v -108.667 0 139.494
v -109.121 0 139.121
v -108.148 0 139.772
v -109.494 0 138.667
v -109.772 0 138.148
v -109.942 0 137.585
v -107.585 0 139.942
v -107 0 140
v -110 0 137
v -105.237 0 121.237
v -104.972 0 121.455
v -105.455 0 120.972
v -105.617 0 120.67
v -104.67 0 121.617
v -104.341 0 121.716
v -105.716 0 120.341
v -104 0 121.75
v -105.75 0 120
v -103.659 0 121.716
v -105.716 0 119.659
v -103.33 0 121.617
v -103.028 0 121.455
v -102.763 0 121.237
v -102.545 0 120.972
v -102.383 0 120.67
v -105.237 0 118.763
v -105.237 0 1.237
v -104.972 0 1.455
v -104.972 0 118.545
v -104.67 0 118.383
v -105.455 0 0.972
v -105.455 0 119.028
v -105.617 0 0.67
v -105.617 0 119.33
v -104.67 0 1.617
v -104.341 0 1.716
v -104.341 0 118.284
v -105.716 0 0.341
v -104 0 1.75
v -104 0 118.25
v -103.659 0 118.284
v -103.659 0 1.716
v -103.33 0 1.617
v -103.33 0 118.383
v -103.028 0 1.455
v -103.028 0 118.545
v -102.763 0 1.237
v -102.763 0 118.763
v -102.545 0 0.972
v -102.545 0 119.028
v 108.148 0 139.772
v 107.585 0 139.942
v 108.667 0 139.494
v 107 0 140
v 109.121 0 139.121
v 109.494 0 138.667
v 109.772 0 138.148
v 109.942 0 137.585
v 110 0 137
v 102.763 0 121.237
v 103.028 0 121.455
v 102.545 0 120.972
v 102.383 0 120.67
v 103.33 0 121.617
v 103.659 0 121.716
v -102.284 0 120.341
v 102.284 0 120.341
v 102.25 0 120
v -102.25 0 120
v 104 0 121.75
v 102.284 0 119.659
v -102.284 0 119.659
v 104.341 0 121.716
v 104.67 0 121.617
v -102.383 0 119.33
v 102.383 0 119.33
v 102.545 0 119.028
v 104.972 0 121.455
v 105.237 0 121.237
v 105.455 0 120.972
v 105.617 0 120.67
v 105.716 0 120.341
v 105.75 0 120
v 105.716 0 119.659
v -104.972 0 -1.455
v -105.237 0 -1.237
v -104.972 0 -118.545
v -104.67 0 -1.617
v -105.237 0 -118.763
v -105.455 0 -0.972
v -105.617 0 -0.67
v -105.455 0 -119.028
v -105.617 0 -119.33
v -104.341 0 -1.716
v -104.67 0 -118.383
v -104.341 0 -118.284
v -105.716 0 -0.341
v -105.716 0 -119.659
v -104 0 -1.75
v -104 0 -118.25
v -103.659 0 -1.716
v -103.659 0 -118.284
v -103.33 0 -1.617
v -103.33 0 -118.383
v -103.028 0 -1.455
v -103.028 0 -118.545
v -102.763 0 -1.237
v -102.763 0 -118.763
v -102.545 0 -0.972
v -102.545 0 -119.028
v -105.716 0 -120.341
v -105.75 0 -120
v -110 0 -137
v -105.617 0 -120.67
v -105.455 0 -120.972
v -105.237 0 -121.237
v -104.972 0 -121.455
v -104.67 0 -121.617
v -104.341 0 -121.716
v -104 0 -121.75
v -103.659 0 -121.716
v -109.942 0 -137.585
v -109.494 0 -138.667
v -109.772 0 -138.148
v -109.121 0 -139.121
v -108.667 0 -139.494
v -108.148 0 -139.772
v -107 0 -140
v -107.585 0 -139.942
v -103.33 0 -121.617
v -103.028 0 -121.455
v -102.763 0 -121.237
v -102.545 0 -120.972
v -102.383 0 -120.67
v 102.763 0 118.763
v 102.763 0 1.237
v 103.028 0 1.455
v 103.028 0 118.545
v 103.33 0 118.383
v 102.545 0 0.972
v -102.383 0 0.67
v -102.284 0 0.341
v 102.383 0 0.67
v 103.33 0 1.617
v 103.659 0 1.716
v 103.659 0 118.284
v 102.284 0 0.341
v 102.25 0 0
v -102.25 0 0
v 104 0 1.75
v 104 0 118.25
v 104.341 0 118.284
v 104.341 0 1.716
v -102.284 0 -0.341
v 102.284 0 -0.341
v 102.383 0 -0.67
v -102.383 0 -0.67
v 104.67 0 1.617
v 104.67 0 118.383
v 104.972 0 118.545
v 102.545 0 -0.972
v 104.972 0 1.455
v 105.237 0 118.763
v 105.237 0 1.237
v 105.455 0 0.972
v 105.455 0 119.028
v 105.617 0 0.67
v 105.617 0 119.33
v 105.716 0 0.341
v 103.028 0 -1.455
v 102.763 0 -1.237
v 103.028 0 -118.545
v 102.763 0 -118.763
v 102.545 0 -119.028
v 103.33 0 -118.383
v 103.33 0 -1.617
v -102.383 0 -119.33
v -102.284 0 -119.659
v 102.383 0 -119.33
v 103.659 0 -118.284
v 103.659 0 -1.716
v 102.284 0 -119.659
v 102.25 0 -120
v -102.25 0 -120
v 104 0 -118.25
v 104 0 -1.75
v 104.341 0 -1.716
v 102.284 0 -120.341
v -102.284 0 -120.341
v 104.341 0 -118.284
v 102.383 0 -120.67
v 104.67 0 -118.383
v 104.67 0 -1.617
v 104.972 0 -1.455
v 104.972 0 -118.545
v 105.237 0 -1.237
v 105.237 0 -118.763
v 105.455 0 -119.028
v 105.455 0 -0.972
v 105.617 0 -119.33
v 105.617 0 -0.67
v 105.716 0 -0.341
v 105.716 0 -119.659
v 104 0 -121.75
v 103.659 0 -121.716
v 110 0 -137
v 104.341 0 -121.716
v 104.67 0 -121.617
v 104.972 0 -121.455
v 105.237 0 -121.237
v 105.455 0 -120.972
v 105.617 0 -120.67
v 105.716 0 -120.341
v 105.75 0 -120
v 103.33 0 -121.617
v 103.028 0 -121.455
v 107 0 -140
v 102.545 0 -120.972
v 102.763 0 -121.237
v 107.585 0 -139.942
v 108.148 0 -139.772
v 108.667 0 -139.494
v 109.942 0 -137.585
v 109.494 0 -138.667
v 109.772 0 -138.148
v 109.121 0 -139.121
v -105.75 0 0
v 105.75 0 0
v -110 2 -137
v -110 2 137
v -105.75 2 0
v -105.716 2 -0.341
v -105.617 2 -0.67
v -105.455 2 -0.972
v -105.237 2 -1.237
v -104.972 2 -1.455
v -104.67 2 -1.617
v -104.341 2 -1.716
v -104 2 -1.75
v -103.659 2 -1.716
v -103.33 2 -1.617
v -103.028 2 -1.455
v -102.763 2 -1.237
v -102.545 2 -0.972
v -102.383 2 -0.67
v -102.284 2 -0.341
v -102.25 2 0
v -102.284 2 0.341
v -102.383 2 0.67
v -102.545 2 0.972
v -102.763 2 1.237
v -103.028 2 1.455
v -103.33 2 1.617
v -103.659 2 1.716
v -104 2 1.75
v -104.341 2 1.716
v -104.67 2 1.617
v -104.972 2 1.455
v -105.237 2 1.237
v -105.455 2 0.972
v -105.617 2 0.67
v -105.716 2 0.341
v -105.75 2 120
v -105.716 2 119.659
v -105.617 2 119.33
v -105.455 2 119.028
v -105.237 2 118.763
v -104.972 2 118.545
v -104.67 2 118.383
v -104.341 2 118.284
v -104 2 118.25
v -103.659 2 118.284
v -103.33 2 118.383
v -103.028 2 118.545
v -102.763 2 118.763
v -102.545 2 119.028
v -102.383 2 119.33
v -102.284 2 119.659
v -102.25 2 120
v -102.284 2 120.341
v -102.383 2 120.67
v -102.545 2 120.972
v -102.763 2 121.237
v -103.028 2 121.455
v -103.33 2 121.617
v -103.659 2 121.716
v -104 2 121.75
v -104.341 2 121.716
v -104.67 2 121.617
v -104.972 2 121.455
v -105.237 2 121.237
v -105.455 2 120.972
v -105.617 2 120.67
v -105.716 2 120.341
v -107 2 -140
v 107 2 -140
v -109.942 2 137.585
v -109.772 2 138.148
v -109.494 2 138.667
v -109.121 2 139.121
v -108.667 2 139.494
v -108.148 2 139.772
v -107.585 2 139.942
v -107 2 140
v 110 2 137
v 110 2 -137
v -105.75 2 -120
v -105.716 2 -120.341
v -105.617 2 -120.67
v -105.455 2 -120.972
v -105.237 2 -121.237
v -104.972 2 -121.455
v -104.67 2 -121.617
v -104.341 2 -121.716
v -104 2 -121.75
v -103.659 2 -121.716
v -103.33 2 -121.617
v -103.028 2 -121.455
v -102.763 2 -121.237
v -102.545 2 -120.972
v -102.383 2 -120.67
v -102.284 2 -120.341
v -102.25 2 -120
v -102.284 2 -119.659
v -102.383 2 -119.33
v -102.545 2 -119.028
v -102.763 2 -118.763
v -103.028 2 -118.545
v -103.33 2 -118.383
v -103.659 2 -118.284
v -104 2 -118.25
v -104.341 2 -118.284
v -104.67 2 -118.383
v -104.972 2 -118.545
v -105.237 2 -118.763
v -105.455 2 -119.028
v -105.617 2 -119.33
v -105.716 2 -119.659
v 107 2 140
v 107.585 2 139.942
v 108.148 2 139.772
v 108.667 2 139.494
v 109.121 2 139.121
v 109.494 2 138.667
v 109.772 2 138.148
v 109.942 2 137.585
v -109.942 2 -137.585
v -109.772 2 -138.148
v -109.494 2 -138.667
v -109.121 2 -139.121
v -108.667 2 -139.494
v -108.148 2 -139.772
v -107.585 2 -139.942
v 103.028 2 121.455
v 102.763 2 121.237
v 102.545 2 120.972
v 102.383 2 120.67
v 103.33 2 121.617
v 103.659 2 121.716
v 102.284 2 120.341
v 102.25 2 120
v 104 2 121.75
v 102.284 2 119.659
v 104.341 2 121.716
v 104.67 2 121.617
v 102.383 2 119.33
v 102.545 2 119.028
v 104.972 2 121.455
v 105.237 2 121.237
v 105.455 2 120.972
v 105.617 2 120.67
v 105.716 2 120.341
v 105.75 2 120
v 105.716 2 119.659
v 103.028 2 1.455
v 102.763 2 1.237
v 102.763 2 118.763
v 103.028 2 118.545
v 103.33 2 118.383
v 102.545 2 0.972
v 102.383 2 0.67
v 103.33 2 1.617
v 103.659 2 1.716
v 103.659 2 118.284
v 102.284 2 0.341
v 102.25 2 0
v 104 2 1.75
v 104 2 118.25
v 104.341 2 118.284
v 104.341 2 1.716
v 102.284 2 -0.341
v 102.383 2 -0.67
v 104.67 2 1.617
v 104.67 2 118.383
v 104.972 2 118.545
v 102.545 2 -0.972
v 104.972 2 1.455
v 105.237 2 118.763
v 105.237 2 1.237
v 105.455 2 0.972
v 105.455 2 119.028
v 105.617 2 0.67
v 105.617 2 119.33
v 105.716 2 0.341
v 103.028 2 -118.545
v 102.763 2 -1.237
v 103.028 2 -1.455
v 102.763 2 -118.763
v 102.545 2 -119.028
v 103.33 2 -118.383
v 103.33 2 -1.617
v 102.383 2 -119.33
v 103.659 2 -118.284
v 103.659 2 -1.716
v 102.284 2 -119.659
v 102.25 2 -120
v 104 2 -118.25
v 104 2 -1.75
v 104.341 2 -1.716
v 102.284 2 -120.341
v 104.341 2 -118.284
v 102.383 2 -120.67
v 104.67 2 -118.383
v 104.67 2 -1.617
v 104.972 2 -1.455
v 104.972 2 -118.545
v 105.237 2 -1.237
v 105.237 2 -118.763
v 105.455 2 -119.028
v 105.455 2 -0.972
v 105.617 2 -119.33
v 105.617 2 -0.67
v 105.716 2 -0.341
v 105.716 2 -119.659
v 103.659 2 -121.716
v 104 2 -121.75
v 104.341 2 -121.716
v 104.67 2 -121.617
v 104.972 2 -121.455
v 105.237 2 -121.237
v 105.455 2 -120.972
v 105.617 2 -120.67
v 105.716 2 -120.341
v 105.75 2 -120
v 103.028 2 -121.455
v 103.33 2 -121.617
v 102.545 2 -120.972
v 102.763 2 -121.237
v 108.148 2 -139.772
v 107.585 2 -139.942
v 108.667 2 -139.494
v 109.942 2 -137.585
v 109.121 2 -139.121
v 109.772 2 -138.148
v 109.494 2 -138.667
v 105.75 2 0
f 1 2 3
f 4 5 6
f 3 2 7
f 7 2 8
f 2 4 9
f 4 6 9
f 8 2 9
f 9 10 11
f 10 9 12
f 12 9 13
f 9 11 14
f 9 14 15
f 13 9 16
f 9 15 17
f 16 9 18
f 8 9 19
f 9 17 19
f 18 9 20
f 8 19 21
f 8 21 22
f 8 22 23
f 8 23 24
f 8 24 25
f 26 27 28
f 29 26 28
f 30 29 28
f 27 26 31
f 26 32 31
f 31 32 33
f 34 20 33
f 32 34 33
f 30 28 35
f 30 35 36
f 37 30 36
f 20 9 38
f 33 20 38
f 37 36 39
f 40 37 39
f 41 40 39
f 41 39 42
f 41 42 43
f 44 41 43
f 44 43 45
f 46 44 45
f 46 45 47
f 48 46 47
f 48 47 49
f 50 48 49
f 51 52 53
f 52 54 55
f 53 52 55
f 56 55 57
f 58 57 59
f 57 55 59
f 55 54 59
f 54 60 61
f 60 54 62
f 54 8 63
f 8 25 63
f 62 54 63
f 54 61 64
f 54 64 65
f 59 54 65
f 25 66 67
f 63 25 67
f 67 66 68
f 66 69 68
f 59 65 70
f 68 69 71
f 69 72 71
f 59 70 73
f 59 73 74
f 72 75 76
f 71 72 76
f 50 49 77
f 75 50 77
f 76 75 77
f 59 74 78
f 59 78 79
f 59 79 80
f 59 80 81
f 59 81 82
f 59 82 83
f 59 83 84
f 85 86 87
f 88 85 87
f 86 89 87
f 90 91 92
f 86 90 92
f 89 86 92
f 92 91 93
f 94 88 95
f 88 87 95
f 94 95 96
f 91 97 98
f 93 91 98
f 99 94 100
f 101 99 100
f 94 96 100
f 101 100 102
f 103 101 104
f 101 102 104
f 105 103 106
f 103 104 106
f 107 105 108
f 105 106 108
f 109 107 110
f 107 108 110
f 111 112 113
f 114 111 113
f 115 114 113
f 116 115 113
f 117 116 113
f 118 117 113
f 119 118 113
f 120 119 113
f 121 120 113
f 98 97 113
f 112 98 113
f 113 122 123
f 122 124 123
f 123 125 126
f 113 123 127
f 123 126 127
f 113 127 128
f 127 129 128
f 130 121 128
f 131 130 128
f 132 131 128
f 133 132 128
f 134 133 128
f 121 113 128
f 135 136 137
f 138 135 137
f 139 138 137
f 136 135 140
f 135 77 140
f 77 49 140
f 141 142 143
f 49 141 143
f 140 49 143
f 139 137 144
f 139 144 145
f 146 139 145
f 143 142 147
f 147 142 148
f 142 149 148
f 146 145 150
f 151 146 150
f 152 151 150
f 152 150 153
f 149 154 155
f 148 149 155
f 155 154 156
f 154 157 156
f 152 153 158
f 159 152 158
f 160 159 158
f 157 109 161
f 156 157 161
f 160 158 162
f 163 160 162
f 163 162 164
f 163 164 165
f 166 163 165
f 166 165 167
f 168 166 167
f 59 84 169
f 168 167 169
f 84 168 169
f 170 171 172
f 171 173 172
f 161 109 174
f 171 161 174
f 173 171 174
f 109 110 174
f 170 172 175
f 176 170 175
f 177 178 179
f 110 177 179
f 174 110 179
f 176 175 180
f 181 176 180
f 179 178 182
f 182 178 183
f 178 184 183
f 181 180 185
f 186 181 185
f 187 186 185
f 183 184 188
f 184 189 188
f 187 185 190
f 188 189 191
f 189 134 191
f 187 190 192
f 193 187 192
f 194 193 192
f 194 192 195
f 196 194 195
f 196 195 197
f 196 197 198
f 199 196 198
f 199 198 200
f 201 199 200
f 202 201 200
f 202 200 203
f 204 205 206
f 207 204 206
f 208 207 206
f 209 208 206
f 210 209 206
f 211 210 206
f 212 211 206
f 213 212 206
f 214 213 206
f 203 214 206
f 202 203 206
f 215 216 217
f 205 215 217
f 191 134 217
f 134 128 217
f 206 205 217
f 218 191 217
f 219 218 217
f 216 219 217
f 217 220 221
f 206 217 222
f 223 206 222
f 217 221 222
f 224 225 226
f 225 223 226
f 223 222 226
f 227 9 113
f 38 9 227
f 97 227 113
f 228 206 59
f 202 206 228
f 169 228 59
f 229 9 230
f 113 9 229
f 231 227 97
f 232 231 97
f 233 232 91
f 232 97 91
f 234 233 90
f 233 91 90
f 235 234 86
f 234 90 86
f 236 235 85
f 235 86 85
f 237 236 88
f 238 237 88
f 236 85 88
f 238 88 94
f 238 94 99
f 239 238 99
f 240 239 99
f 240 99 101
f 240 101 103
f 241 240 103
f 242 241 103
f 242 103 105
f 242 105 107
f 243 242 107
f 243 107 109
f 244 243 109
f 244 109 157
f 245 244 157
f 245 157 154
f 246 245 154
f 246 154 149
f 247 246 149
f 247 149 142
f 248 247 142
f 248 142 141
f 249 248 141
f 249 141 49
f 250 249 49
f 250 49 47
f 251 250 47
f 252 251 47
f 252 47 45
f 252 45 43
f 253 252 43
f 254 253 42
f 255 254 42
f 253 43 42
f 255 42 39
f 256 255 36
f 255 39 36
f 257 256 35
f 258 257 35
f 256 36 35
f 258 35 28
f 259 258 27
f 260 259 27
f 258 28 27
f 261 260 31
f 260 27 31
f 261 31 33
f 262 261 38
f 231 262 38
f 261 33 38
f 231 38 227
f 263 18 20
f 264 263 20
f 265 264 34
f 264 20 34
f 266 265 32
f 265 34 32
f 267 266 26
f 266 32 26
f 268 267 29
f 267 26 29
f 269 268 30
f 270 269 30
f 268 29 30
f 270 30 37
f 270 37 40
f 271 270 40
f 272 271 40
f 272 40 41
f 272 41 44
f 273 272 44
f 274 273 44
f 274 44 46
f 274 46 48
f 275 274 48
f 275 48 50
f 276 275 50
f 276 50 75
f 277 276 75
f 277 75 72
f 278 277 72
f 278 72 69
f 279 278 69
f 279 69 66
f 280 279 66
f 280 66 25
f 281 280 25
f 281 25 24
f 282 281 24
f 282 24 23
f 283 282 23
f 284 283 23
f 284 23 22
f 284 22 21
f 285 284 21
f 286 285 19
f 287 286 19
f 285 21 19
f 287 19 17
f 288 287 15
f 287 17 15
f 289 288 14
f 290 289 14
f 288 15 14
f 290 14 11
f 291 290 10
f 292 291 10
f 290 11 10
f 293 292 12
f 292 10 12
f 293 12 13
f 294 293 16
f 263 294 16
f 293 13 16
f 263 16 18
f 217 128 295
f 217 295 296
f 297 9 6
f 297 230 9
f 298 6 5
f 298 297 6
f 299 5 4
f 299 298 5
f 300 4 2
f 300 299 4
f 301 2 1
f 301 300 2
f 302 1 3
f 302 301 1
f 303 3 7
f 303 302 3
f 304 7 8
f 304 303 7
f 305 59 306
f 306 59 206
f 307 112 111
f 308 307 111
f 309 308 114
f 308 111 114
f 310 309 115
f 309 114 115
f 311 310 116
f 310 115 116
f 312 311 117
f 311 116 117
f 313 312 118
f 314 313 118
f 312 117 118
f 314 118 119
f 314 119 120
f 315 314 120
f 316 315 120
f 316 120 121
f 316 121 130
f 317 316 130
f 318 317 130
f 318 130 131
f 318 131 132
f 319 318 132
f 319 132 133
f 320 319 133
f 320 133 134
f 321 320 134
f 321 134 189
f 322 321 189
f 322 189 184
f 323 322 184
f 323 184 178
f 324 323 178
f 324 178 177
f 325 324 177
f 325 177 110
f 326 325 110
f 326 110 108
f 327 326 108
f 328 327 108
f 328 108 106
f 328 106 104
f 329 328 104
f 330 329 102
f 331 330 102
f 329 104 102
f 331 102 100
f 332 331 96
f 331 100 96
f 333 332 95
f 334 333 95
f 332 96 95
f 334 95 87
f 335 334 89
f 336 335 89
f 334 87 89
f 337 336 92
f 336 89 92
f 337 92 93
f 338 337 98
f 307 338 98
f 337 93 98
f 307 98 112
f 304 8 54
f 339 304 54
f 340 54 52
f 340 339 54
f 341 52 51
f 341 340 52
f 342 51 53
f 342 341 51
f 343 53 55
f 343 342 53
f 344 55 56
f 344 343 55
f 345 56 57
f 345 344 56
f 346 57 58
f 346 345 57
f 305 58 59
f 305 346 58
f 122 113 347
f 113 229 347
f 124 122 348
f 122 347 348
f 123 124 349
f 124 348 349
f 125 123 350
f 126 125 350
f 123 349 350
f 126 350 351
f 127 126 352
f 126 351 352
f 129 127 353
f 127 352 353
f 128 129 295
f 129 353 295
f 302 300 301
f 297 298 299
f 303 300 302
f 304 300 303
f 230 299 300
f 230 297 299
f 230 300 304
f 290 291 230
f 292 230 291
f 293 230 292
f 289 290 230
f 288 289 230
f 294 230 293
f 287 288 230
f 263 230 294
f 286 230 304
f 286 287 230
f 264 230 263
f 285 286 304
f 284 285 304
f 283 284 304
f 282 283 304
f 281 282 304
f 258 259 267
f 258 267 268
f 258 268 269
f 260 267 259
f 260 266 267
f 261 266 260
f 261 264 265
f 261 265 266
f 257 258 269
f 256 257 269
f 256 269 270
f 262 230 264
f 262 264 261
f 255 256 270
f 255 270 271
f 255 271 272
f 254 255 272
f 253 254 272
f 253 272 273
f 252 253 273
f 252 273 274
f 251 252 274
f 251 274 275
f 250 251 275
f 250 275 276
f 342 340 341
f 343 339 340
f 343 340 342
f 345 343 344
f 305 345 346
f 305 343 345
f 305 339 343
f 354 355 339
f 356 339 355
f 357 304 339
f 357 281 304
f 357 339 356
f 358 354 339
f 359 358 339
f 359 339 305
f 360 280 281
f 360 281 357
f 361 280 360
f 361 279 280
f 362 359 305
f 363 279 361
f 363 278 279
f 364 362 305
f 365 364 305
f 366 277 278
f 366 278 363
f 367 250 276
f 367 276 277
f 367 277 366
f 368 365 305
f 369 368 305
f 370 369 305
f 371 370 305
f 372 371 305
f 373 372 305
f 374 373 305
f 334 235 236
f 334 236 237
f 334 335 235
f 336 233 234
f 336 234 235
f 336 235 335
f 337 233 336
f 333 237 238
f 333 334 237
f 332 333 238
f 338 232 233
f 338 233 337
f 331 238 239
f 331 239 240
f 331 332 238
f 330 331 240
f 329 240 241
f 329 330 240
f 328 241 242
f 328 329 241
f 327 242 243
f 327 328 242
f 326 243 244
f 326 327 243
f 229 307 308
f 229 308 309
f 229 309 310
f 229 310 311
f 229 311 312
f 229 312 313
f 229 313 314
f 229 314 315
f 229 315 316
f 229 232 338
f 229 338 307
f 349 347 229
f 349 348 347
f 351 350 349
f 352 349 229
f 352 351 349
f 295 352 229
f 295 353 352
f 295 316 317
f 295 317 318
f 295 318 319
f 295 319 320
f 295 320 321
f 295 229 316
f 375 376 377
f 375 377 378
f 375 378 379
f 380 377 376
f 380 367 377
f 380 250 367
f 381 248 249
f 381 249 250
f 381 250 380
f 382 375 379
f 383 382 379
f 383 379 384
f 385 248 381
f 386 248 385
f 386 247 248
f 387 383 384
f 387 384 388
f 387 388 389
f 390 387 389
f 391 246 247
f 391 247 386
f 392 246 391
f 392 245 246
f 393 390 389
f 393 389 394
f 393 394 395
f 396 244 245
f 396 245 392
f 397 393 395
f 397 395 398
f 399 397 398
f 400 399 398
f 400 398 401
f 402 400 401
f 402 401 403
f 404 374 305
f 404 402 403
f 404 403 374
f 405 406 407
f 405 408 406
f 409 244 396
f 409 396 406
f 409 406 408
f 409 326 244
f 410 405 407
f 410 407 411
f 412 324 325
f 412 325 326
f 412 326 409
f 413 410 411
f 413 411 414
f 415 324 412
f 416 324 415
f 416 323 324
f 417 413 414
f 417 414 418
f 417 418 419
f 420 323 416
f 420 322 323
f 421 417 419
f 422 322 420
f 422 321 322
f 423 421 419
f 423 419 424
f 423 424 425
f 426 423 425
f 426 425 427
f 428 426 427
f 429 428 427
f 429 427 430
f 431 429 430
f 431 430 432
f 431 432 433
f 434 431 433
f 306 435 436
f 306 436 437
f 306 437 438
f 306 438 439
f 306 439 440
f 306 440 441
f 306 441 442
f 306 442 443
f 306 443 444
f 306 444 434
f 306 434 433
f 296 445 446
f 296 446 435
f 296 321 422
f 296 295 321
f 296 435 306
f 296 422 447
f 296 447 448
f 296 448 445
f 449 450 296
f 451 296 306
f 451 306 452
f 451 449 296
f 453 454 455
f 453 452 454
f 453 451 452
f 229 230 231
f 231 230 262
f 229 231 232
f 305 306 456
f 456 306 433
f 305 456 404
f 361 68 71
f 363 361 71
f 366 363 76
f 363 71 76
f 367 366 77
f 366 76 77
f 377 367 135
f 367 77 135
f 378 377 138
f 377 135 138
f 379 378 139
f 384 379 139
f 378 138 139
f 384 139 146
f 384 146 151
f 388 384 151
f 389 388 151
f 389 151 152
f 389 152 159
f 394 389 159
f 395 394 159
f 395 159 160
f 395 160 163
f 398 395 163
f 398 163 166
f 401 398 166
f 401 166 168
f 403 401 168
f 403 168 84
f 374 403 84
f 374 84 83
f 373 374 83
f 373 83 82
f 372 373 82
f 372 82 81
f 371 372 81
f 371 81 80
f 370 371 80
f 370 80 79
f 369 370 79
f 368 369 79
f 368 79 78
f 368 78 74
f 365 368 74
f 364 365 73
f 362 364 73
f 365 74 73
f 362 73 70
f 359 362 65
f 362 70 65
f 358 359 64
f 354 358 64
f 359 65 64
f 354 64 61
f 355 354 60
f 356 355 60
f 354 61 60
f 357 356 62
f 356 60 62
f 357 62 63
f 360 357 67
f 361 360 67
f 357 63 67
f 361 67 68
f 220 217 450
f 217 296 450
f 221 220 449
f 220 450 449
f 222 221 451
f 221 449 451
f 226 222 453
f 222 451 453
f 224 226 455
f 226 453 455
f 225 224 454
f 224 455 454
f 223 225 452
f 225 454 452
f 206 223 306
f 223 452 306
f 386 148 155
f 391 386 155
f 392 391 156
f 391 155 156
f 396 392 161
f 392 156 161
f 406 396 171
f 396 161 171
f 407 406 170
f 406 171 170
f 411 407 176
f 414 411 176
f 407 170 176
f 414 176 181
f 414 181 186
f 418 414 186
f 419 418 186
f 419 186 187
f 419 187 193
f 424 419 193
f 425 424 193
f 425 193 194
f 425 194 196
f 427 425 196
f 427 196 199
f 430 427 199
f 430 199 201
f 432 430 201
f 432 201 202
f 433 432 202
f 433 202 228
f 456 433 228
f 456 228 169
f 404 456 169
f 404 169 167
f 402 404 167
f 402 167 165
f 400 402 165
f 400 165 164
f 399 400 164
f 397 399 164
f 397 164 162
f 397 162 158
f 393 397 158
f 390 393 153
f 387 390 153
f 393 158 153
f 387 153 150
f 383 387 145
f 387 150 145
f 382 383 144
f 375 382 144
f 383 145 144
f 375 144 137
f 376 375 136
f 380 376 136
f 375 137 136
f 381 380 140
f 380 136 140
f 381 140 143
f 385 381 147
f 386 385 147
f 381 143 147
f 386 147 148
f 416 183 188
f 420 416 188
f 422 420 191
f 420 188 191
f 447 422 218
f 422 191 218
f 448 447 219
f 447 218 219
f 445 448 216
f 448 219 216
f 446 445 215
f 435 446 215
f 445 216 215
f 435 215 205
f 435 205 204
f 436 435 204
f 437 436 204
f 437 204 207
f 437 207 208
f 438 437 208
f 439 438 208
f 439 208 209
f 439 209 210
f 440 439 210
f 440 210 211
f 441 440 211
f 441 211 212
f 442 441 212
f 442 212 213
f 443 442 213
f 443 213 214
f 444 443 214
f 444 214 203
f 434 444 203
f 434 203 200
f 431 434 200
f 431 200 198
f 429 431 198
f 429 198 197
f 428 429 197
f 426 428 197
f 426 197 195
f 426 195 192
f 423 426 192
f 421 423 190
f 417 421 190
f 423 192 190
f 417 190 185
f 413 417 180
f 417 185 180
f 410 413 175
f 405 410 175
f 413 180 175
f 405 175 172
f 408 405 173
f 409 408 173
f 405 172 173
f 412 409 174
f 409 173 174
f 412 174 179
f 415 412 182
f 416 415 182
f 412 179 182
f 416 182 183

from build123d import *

# Parameters (mm, degrees)
SKETCH1_W                  = 220
SKETCH1_H                  = 280
BOSS_EXTRUDE1_DEPTH        = 2
F_3_5_3_5_DIAMETER_HOLE1_D = 3.5
FILLET1_R                  = 3


with BuildPart() as part:
    # Sketch1 → Boss-Extrude1 (new body)
    with BuildSketch(Plane(origin=(0, 0, 0), x_dir=(1, 0, 0), z_dir=(0, 1, 0))):
        Rectangle(SKETCH1_W, SKETCH1_H)
    extrude(amount=BOSS_EXTRUDE1_DEPTH)

    # Ø3.5 (3.5) Diameter Hole1 (through all)
    with Locations(Plane(origin=(0, 2, 0), x_dir=(1, 0, 0), z_dir=(0, 1, 0))):
        with Locations((-104, -120), (104, -120), (104, 120), (-104, 120), (104, 0), (-104, 0)):
            Hole(F_3_5_3_5_DIAMETER_HOLE1_D / 2)

    # Fillet1
    fillet1_edges = [part.edges().sort_by_distance(p)[0] for p in [
        (110, 1, 140),
        (-110, 1, 140),
        (-110, 1, -140),
        (110, 1, -140),
    ]]
    fillet(fillet1_edges, radius=FILLET1_R)


solid = part.part
